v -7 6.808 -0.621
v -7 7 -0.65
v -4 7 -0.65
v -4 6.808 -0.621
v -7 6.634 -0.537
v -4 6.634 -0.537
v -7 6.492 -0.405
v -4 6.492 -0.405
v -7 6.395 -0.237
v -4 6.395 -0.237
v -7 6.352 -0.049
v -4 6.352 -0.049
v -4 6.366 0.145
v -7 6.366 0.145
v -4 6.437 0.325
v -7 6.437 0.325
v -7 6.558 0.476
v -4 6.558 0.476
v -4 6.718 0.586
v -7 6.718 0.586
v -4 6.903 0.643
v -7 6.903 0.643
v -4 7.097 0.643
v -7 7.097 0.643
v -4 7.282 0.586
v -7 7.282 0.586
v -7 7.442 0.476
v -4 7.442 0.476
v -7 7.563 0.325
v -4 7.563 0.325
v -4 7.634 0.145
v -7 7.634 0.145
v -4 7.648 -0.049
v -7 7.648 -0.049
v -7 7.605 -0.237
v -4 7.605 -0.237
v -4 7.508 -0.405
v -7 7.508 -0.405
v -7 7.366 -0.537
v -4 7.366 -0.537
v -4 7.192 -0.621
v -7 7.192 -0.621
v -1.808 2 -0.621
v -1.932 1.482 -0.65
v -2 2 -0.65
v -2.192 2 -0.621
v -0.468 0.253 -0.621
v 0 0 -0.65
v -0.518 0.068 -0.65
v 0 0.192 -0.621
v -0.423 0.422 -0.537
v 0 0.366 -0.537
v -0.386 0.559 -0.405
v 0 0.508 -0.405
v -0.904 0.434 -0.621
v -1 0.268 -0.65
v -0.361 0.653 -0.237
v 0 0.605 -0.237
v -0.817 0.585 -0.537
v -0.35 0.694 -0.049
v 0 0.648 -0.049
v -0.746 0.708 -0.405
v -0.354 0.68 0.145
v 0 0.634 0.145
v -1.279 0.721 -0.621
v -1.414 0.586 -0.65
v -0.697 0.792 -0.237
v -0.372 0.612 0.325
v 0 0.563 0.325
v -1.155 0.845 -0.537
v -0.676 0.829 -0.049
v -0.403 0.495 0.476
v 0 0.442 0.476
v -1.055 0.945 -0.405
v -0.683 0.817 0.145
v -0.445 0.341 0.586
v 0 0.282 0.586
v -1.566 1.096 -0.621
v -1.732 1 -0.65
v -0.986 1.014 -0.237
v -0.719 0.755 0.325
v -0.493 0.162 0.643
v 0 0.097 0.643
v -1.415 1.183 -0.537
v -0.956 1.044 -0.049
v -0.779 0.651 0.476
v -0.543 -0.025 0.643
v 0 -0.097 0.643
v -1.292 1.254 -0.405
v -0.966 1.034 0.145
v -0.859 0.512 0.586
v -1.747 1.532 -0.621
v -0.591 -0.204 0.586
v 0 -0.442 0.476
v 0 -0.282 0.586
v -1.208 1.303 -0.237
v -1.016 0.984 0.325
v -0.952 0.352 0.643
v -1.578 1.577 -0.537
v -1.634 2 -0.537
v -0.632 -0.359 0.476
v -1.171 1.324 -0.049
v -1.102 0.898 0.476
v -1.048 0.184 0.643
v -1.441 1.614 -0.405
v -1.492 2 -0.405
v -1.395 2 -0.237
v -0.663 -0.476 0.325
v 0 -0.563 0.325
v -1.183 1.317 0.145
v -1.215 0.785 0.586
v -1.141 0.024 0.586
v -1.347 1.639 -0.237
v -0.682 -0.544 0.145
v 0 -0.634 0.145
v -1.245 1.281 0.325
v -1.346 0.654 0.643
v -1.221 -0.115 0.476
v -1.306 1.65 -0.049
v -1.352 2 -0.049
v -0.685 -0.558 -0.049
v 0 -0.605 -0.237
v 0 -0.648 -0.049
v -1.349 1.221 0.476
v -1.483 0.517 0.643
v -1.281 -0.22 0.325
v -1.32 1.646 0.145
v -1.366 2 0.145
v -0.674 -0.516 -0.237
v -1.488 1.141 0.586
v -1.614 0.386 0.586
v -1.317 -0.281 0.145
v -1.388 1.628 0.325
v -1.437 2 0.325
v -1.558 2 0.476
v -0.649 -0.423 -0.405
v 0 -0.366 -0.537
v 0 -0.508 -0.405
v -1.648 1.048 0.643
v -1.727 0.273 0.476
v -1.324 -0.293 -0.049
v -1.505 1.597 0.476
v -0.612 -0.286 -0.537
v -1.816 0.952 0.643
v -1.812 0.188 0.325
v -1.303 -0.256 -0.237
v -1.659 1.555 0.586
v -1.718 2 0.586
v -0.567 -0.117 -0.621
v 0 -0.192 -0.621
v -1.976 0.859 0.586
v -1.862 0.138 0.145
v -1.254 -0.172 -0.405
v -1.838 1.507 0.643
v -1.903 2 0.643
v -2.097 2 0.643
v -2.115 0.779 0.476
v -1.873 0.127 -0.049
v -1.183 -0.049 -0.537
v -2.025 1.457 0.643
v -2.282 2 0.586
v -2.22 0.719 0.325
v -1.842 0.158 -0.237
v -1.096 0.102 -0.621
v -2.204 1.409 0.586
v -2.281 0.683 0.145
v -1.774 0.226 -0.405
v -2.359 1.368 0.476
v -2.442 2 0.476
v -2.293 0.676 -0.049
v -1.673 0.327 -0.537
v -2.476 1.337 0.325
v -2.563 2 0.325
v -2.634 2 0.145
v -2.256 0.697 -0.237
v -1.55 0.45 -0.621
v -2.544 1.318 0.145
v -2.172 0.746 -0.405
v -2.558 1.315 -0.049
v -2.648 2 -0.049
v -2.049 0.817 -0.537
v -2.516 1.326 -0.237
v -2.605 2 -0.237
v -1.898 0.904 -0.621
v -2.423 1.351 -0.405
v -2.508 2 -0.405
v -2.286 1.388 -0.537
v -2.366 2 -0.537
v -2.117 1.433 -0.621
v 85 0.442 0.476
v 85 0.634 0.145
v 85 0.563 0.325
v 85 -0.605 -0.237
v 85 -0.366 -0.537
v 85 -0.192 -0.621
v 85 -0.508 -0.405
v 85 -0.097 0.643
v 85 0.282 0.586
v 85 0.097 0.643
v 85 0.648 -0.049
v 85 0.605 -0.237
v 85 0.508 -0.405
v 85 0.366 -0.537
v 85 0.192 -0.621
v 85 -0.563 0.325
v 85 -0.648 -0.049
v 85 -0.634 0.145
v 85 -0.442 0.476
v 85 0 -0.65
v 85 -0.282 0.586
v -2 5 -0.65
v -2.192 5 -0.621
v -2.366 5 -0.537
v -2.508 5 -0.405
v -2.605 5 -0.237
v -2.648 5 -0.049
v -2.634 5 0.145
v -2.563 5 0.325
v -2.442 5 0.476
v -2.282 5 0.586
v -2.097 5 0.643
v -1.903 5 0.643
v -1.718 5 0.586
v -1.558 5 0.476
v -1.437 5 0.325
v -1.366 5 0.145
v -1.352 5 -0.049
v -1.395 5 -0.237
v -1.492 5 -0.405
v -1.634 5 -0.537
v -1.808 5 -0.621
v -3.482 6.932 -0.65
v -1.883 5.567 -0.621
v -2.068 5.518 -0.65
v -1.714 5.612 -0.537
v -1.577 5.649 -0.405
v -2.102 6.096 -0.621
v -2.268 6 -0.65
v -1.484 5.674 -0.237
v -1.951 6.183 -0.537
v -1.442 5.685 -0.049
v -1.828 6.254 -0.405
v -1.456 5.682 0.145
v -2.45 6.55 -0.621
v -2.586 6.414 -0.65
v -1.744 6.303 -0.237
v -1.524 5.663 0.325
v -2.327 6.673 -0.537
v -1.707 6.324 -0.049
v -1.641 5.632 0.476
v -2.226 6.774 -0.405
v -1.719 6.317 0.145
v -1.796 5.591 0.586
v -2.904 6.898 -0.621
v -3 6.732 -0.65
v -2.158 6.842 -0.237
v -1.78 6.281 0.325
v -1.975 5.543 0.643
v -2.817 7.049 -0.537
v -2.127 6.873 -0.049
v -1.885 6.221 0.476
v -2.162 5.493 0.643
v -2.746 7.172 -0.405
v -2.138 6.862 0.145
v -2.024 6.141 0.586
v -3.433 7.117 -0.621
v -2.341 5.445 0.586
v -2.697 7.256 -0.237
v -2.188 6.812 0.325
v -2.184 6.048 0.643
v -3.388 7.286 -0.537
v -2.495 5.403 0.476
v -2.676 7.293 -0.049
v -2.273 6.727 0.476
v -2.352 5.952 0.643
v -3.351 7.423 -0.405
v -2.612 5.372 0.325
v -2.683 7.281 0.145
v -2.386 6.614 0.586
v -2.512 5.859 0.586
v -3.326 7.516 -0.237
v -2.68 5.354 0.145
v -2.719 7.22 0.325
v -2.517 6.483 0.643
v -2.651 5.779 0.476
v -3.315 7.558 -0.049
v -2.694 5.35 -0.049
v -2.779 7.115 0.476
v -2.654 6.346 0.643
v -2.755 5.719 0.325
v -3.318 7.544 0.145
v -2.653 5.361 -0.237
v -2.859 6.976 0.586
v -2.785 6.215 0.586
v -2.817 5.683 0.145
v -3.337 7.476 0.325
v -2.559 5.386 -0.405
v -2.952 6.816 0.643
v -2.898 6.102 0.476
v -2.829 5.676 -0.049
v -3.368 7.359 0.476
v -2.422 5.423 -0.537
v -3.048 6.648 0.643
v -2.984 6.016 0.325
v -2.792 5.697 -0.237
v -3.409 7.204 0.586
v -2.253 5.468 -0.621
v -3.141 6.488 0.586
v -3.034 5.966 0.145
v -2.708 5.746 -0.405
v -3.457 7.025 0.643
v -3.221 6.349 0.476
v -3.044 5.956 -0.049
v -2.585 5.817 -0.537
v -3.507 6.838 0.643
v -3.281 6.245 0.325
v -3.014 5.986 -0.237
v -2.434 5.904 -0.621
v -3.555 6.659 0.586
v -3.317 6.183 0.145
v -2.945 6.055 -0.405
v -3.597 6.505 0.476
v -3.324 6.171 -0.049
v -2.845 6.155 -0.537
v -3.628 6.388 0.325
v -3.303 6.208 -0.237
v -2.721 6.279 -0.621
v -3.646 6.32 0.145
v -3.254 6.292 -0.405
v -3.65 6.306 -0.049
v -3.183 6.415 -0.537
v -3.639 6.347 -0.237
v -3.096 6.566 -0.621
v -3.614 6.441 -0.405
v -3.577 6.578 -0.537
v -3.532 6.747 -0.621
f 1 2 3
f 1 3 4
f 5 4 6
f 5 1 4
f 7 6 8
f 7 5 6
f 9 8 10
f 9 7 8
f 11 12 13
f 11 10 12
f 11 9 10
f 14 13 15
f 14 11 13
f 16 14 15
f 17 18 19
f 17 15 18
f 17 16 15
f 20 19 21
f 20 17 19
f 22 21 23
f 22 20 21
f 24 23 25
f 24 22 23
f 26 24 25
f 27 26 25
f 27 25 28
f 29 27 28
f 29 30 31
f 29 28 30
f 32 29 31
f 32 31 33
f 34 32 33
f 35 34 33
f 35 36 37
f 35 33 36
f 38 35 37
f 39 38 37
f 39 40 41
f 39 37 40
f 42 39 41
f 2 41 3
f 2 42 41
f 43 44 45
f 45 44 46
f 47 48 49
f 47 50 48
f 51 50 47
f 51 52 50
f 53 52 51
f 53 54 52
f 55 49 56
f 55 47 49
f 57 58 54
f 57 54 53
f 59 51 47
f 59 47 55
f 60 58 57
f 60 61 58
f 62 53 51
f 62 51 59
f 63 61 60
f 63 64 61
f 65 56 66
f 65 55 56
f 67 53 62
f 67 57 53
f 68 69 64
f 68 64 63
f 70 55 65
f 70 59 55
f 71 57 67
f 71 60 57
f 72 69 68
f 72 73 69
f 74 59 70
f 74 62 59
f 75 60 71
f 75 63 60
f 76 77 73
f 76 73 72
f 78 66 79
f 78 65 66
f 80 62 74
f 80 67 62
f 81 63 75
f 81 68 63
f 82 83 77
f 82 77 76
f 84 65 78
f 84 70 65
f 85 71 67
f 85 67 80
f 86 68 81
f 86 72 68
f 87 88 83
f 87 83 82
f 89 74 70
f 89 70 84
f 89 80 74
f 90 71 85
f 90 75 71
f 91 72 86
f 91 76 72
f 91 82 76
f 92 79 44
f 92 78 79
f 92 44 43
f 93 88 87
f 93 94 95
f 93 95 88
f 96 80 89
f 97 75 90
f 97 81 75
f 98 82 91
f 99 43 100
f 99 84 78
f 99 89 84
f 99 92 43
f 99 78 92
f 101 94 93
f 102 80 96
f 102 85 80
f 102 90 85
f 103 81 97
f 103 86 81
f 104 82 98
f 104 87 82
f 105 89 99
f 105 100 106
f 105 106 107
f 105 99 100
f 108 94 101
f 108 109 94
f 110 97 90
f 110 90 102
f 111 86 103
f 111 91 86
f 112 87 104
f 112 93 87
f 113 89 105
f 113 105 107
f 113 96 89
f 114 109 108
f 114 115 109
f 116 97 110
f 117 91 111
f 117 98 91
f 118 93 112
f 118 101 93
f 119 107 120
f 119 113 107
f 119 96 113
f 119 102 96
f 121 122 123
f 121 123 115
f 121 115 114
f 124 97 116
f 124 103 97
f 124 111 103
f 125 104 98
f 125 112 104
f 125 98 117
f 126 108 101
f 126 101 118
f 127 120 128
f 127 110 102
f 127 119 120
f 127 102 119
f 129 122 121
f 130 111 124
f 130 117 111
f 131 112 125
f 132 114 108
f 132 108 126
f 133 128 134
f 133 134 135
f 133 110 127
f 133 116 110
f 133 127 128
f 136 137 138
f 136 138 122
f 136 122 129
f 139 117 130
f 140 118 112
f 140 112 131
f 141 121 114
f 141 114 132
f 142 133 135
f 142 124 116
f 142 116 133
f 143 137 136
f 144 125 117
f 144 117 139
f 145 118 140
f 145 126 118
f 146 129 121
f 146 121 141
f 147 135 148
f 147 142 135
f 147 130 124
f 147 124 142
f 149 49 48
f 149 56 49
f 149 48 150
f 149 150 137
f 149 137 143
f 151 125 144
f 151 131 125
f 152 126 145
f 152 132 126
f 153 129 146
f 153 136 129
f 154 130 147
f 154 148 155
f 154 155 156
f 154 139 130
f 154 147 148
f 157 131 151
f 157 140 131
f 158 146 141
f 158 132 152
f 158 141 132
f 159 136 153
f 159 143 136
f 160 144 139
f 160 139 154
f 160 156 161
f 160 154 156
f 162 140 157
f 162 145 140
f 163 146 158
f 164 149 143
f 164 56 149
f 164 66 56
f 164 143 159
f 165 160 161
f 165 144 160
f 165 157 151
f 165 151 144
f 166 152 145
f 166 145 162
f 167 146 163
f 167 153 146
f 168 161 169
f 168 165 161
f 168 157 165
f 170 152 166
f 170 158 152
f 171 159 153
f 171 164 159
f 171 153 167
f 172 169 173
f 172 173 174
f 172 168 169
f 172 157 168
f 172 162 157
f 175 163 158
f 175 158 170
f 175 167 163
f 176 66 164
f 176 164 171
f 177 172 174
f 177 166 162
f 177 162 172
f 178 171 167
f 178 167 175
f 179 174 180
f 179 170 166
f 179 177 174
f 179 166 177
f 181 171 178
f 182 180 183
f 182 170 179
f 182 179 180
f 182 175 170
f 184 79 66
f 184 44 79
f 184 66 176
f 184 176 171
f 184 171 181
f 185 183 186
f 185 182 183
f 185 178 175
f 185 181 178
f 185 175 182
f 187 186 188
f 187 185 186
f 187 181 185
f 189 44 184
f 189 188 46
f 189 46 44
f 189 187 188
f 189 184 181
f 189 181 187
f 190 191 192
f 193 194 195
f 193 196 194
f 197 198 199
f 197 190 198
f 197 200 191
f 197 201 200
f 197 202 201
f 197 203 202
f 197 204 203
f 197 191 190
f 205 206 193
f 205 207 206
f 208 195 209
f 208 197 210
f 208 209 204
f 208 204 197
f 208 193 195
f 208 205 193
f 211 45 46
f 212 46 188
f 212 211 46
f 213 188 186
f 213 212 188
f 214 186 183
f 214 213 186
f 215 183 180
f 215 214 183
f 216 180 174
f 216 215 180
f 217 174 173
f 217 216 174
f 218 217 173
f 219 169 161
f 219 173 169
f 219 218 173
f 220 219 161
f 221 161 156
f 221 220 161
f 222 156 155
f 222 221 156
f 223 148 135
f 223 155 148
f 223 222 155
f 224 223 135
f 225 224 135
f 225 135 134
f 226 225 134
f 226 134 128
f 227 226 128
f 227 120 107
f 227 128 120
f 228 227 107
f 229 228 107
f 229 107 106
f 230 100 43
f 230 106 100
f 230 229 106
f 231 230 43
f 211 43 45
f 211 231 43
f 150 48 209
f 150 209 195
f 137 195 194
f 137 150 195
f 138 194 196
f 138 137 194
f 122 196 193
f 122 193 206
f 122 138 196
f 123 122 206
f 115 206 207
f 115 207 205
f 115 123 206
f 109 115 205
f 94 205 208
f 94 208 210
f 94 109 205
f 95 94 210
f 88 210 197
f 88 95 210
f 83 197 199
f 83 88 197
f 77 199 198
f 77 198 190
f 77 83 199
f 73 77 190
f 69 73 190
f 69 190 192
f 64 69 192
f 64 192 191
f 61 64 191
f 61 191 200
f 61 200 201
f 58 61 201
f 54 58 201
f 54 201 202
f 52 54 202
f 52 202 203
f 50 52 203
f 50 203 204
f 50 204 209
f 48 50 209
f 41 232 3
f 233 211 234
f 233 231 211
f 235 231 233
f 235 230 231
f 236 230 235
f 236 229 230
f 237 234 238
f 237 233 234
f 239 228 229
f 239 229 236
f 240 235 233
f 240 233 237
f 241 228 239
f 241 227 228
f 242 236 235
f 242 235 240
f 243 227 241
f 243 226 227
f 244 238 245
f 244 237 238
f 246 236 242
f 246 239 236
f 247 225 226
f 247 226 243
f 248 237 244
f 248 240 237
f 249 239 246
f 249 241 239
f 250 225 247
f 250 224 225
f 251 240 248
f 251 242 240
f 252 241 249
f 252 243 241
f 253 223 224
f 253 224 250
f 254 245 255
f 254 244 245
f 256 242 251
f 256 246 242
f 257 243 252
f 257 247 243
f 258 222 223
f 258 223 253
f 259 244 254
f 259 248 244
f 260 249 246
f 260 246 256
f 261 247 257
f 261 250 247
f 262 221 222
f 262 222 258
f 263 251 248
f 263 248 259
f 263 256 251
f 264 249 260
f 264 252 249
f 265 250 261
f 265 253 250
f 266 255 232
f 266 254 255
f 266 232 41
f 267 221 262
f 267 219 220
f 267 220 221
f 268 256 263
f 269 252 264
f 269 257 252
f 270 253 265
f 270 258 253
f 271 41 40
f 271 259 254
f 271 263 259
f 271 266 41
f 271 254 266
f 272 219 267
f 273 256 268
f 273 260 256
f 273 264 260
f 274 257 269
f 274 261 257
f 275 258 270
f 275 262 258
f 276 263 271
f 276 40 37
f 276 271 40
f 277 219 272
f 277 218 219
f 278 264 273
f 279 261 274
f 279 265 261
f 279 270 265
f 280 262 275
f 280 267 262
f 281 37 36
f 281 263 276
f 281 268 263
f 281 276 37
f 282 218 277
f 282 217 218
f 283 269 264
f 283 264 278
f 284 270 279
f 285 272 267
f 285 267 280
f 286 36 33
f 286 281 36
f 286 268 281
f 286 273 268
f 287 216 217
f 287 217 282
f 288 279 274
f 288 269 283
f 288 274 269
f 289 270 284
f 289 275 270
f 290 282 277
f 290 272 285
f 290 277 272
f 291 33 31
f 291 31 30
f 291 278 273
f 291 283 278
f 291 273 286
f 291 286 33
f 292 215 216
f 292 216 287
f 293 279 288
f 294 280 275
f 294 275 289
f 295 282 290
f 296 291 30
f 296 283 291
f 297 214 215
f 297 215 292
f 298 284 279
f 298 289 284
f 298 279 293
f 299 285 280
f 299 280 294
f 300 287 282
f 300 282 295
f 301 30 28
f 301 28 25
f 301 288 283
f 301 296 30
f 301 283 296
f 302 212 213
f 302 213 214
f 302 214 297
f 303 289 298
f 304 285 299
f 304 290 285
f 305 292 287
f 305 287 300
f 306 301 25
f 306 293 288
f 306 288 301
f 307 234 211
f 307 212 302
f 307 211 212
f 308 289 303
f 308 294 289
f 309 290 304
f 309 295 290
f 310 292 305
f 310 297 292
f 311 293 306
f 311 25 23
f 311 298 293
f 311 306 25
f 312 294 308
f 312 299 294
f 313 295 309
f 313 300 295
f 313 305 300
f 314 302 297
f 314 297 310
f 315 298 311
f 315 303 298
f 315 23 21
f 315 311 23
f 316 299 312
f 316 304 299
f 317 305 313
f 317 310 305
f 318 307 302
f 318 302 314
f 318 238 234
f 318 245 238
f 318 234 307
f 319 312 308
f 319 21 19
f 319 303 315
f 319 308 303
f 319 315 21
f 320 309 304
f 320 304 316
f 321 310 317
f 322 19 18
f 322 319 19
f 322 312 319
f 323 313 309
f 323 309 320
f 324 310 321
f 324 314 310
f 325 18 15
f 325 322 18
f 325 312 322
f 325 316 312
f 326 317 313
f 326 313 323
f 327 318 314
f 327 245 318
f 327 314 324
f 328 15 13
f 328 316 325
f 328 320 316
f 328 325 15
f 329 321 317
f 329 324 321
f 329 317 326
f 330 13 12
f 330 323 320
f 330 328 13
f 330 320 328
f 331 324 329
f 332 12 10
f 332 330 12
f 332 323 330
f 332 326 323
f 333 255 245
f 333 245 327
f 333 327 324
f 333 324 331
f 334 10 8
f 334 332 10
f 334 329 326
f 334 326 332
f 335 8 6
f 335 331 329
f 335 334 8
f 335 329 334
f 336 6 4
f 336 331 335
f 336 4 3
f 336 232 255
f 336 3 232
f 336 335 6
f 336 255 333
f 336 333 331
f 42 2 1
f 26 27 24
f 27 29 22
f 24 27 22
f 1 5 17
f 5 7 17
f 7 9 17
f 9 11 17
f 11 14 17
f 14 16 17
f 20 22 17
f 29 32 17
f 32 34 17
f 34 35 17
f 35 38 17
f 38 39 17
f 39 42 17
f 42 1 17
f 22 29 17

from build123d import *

# Parameters (mm, degrees)
SKETCH2_R = 0.65


with BuildPart() as part:
    # Sweep1: sweep along a path in Sketch1
    with BuildLine(Plane.XY) as sweep1_path:
        Line((85, 0), (0, 0))
        ThreePointArc((0, 0), (-1.414213562, 0.585786438), (-2, 2))
        Line((-2, 2), (-2, 5))
        ThreePointArc((-2, 5), (-2.585786438, 6.414213562), (-4, 7))
        Line((-4, 7), (-7, 7))
    # Sketch2 → Sweep1 (sweep)
    with BuildSketch(Plane(origin=(85, 0, 0), x_dir=(0, 0, -1), z_dir=(1, 0, 0))):
        Circle(SKETCH2_R)
    sweep(path=sweep1_path.line)


solid = part.part
